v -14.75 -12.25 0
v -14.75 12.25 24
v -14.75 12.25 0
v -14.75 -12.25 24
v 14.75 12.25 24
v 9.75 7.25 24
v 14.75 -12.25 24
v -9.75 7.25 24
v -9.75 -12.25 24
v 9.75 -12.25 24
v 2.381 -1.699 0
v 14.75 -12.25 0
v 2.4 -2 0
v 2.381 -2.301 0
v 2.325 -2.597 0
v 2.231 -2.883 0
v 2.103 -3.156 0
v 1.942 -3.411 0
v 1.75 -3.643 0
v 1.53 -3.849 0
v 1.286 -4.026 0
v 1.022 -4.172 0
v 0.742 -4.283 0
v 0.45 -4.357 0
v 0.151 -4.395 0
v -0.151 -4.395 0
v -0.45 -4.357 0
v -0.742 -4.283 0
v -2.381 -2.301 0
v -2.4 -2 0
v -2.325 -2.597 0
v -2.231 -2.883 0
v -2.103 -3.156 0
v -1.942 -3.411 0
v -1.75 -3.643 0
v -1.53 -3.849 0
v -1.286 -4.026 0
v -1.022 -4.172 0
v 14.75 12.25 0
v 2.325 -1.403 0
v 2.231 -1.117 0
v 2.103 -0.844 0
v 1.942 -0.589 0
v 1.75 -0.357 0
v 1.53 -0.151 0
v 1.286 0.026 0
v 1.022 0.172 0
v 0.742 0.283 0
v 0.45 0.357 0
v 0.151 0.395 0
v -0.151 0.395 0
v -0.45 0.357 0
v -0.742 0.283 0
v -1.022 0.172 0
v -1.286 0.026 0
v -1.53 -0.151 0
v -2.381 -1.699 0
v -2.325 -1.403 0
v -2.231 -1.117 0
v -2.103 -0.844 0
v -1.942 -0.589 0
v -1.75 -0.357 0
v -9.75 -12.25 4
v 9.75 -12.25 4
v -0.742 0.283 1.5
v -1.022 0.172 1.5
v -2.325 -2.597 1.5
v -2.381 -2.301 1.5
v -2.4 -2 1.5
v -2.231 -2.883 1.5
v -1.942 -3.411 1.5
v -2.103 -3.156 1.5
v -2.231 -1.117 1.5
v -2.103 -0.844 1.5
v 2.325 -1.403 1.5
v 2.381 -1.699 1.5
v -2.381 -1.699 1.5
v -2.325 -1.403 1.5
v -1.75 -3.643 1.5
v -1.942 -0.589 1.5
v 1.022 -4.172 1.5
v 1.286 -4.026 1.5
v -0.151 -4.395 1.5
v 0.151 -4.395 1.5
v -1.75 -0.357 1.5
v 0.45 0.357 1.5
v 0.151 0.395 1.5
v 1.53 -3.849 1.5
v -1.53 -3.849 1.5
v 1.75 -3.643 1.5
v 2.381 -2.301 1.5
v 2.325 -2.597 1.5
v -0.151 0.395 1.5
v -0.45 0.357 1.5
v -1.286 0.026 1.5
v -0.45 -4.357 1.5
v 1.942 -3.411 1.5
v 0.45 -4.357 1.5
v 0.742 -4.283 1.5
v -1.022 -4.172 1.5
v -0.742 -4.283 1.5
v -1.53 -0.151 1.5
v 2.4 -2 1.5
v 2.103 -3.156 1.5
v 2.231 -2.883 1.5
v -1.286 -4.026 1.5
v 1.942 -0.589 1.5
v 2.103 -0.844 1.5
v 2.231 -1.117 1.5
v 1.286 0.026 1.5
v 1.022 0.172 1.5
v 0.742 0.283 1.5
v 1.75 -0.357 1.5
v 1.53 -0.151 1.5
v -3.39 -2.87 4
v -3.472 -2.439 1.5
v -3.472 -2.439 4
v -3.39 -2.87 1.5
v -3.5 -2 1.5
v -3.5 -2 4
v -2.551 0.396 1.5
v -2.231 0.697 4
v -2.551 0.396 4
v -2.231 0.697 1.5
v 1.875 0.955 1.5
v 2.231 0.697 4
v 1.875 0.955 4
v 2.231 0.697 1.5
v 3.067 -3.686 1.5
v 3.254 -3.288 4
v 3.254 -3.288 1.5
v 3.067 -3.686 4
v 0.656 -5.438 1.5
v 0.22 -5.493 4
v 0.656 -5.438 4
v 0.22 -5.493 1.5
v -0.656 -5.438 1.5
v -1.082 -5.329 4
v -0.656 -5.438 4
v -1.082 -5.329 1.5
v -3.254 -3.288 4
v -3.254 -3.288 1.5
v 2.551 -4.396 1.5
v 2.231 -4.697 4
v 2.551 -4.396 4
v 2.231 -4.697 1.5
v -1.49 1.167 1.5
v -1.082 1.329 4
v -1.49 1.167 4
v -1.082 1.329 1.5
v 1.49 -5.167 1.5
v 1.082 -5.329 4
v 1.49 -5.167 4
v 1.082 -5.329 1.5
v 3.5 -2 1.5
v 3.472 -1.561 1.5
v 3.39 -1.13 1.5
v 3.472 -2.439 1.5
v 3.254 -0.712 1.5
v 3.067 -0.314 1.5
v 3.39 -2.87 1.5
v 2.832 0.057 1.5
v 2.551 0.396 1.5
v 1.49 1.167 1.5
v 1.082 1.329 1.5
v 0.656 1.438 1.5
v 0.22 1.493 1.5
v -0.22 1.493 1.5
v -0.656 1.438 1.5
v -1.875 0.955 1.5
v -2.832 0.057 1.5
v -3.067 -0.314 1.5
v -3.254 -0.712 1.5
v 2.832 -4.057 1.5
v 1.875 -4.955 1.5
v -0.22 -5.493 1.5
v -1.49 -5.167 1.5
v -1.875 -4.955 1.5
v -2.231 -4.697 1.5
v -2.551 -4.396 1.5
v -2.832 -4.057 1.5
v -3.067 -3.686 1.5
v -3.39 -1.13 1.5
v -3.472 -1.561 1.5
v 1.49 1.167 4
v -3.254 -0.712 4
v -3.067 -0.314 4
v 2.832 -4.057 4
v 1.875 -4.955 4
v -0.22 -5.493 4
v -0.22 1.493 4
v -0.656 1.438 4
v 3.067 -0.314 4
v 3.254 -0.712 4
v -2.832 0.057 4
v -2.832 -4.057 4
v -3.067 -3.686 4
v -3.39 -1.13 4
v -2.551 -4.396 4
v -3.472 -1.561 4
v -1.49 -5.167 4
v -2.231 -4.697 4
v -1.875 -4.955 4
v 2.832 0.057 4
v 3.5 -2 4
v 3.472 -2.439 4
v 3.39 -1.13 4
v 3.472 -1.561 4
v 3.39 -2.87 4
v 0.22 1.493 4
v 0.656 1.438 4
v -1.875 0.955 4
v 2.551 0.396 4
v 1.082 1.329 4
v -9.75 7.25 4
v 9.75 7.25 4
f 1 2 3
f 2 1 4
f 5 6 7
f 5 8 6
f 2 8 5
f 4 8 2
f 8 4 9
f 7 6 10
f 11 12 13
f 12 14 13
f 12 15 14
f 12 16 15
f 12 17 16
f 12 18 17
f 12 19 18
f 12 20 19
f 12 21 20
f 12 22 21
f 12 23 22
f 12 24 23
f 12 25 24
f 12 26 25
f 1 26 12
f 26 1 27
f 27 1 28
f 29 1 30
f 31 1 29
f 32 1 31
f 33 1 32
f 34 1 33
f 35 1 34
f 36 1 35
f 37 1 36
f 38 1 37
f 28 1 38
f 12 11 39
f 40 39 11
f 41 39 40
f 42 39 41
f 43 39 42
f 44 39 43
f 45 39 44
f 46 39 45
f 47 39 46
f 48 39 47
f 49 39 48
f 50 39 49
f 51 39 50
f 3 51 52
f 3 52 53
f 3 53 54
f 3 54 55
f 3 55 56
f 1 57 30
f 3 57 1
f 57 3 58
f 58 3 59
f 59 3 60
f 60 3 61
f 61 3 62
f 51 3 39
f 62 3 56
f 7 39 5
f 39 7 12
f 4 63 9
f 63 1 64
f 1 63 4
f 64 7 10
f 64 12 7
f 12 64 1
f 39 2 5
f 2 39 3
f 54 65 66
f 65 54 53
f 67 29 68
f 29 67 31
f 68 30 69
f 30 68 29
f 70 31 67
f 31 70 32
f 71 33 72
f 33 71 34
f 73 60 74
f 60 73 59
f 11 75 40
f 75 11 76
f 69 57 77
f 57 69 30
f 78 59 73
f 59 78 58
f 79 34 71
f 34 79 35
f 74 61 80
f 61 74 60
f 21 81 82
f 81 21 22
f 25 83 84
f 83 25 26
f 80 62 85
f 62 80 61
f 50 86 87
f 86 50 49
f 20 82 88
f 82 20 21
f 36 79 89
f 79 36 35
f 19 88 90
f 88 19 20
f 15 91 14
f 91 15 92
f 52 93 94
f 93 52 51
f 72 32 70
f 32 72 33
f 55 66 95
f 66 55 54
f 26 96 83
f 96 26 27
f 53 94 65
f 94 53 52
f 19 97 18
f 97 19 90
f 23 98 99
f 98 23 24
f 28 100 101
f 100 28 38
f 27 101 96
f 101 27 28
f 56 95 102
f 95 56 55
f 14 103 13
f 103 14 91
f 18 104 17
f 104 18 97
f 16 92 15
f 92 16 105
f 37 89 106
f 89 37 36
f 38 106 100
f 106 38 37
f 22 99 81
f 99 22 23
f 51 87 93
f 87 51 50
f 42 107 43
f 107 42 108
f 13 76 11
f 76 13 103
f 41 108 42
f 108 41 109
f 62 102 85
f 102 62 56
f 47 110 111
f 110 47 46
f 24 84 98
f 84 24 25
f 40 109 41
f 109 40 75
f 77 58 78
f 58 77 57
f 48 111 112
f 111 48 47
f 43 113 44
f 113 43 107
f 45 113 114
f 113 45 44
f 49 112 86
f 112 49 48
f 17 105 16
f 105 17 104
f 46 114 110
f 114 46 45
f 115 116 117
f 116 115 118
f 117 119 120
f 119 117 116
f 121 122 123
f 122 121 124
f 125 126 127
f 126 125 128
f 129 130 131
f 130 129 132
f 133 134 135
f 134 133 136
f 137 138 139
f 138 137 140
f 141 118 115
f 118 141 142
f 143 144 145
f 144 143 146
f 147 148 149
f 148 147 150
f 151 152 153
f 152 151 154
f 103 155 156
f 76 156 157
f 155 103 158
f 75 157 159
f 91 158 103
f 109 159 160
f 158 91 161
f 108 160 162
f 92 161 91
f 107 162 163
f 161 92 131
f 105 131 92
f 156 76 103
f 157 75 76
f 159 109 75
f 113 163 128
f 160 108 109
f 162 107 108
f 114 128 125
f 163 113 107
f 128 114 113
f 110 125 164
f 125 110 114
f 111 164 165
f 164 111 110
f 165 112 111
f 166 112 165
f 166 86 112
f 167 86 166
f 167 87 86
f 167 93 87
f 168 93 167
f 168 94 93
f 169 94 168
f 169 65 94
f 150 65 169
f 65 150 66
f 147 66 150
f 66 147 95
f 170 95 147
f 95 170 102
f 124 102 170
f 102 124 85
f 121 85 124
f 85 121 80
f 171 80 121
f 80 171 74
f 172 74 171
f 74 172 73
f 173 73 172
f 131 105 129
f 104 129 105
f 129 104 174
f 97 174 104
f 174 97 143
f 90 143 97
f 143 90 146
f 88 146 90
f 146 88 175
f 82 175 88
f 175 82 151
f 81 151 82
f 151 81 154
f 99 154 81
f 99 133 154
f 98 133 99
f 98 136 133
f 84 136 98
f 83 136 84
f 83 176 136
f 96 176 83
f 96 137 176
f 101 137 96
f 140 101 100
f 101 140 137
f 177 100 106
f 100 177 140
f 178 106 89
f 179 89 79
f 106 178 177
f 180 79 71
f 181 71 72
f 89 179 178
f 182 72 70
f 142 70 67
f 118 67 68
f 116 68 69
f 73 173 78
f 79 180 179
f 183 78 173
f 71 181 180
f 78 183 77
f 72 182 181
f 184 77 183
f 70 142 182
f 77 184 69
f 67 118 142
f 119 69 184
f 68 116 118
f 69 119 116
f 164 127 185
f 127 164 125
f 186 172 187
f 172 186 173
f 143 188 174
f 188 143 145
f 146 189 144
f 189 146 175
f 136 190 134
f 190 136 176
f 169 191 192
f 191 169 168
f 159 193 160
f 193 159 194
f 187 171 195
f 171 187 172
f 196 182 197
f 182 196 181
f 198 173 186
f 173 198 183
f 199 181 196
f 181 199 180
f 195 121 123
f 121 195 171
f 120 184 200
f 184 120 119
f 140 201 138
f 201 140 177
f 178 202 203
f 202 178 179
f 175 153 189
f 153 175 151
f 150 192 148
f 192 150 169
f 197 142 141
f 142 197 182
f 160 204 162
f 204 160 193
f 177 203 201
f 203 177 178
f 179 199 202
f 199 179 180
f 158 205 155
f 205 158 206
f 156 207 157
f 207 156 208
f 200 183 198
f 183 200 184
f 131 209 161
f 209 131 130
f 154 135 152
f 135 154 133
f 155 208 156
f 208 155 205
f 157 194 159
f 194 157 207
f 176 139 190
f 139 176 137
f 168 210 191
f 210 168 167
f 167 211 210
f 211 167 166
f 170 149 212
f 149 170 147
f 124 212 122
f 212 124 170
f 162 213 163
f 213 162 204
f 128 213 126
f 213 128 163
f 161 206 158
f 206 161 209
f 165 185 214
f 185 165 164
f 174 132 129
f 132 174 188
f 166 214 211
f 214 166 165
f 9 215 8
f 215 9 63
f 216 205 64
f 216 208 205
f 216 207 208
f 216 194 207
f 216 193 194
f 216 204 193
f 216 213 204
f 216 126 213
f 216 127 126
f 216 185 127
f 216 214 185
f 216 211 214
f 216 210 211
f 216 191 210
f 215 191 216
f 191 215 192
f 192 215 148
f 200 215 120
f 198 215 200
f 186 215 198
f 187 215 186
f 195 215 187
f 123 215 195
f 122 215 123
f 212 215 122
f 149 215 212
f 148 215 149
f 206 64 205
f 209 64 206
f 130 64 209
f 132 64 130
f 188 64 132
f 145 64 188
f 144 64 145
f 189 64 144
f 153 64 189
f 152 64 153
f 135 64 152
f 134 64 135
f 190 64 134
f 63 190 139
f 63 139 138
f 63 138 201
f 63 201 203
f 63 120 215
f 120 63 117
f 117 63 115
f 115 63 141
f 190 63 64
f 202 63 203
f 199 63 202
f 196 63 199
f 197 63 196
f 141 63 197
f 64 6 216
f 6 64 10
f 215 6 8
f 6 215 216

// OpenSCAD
//Square Rod or Tubing Bracket
//Designed by Bryscus: Bryce B.

//Number of Holes
Num_Holes=1; //[1:2]

//Extension Distance
ED=20;

//Tubing Width
TW=19.5;

//Tubing Slot Wall Thickness
WT=5;

//Screw Hole Radius
SHR=2.4;

//(1 Hole) Screw Head Size (radius)
SHS=3.5;

//(1 Hole) Screw Head Depth
SHD=2.5;

//(2 Holes) Screw Bracket Oversizing
SBO=0;

//(2 Holes) Screw Bracket Tab Length
TL=20;

//(2 Holes) Screw Distance
SD=9;

//Mount Thickness
MT=4;

//(2 Holes) Screw Bracket Fillet Radius
FR=5;

if(Num_Holes == 1)
{
rotate([0,0,180])
difference(){
translate([0,0,ED/2+MT/2])
	cube([TW+(WT*2), TW+WT, ED+MT],center=true);
translate([0,MT/2,MT/2])
	cylinder(h=MT+5, r=SHR,$fn=50,center=true); // screw hole
translate([0,MT/2,MT-SHD])
	cylinder(h=SHD+1, r=SHS,$fn=50); // screw head hole
translate([0,WT,(ED+5)/2+MT])
	cube([TW,TW+WT,ED+5],center=true);
}
}

if(Num_Holes == 2)
{
rotate([0,0,180])
difference(){
union(){
	translate([-(TW+(WT*2)+SBO*2-FR*2)/2,-(TW+WT*2+(TL-FR)*2)/2,0]) 
	minkowski(){
		cube([TW+(WT*2)+SBO*2-FR*2,TW+WT*2+(TL-FR)*2,MT/2]); // Screw Bracket
		cylinder(r=FR, h=MT/2,$fn=50);
	}
	translate([0,0,ED/2+MT])
		cube([TW+(WT*2), TW+WT*2, ED],center=true); //Tube Holder Outside
}
translate([0,TL/2+WT+TW/2,MT/2])  //TW+SD
	cylinder(h=MT+5, r=SHR,$fn=50,center=true); //screw hole
translate([0,-(TL/2+WT+TW/2),MT/2])  //-(TL/2+TW/4+WT/2)
	cylinder(h=MT+5, r=SHR,$fn=50,center=true); // screw hole
translate([0,WT,(ED+5)/2+MT])
	cube([TW,TW+WT*2,ED+5],center=true); //tubing opening
}
}
